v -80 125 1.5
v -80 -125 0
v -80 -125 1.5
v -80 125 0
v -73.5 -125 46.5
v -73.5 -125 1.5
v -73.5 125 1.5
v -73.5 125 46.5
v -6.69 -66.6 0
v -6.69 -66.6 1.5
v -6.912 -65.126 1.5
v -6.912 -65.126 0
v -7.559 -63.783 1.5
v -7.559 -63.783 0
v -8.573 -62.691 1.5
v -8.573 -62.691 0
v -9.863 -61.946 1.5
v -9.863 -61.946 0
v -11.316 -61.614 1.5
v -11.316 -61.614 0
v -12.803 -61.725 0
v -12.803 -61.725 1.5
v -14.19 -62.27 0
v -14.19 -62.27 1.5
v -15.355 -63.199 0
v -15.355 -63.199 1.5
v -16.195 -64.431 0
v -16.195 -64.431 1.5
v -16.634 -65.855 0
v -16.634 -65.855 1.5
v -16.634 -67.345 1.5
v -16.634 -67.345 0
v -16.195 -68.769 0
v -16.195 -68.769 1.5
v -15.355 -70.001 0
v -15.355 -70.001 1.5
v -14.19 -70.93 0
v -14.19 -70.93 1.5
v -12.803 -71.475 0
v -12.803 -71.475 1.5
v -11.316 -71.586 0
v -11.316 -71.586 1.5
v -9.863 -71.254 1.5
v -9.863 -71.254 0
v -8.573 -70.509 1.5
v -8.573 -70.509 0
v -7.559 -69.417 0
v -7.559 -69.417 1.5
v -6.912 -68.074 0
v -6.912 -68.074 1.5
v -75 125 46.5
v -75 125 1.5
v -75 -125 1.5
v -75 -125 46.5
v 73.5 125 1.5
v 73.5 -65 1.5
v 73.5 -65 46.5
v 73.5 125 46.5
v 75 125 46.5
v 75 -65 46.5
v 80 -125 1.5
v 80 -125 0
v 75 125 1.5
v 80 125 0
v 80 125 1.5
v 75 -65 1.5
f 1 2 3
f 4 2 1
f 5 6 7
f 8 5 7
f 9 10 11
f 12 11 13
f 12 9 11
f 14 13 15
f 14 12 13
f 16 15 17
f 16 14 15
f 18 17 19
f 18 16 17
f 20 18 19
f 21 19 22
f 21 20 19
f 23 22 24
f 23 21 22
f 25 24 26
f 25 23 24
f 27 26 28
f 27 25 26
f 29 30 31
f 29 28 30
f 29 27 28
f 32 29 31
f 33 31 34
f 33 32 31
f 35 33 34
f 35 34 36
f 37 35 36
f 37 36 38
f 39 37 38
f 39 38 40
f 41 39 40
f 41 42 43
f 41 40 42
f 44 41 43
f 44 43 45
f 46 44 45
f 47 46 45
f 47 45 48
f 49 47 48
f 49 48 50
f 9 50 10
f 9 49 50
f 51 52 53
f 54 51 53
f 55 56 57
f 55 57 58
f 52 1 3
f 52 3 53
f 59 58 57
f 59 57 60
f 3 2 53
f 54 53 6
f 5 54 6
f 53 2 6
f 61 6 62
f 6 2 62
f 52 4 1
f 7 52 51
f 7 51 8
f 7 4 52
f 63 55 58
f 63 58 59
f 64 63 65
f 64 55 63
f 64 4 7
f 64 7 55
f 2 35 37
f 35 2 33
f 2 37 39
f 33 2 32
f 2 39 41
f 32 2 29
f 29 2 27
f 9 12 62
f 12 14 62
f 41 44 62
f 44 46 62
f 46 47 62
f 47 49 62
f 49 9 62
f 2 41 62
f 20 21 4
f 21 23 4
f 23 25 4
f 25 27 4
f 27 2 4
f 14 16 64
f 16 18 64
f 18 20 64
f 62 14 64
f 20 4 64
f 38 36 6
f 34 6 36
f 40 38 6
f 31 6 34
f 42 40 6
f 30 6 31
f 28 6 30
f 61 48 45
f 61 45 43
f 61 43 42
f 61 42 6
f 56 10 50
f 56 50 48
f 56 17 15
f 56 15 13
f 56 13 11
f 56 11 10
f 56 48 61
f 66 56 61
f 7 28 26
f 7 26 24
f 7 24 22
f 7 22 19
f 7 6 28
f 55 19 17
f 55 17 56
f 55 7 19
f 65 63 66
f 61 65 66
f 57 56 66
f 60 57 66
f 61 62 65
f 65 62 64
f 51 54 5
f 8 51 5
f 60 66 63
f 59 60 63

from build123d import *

# Parameters (mm, degrees)
SKETCH3_W           = 160
SKETCH3_H           = 250
BOSS_EXTRUDE2_DEPTH = 1.5
SKETCH4_R           = 5
CUT_EXTRUDE4_DEPTH  = 149.415801046
SKETCH6_W           = 1.5
SKETCH6_H           = 190
BOSS_EXTRUDE4_DEPTH = 45


with BuildPart() as part:
    # Sketch3 → Boss-Extrude2 (new body)
    with BuildSketch(Plane.XY):
        Rectangle(SKETCH3_W, SKETCH3_H)
    extrude(amount=BOSS_EXTRUDE2_DEPTH)

    # Sketch4 → Cut-Extrude4 (cut, through all)
    with BuildSketch(Plane.XY):
        with Locations((-11.69, -66.6)):
            Circle(SKETCH4_R)
    extrude(amount=CUT_EXTRUDE4_DEPTH, mode=Mode.SUBTRACT)

    # Sketch6 → Boss-Extrude4 (add)
    with BuildSketch(Plane.XY.offset(1.5)):
        Polygon((-73.5, 13.5), (-73.5, 125), (-75, 125), (-75, -125), (-73.5, -125), align=None)
        with Locations((74.25, 30)):
            Rectangle(SKETCH6_W, SKETCH6_H)
    extrude(amount=BOSS_EXTRUDE4_DEPTH)


solid = part.part
